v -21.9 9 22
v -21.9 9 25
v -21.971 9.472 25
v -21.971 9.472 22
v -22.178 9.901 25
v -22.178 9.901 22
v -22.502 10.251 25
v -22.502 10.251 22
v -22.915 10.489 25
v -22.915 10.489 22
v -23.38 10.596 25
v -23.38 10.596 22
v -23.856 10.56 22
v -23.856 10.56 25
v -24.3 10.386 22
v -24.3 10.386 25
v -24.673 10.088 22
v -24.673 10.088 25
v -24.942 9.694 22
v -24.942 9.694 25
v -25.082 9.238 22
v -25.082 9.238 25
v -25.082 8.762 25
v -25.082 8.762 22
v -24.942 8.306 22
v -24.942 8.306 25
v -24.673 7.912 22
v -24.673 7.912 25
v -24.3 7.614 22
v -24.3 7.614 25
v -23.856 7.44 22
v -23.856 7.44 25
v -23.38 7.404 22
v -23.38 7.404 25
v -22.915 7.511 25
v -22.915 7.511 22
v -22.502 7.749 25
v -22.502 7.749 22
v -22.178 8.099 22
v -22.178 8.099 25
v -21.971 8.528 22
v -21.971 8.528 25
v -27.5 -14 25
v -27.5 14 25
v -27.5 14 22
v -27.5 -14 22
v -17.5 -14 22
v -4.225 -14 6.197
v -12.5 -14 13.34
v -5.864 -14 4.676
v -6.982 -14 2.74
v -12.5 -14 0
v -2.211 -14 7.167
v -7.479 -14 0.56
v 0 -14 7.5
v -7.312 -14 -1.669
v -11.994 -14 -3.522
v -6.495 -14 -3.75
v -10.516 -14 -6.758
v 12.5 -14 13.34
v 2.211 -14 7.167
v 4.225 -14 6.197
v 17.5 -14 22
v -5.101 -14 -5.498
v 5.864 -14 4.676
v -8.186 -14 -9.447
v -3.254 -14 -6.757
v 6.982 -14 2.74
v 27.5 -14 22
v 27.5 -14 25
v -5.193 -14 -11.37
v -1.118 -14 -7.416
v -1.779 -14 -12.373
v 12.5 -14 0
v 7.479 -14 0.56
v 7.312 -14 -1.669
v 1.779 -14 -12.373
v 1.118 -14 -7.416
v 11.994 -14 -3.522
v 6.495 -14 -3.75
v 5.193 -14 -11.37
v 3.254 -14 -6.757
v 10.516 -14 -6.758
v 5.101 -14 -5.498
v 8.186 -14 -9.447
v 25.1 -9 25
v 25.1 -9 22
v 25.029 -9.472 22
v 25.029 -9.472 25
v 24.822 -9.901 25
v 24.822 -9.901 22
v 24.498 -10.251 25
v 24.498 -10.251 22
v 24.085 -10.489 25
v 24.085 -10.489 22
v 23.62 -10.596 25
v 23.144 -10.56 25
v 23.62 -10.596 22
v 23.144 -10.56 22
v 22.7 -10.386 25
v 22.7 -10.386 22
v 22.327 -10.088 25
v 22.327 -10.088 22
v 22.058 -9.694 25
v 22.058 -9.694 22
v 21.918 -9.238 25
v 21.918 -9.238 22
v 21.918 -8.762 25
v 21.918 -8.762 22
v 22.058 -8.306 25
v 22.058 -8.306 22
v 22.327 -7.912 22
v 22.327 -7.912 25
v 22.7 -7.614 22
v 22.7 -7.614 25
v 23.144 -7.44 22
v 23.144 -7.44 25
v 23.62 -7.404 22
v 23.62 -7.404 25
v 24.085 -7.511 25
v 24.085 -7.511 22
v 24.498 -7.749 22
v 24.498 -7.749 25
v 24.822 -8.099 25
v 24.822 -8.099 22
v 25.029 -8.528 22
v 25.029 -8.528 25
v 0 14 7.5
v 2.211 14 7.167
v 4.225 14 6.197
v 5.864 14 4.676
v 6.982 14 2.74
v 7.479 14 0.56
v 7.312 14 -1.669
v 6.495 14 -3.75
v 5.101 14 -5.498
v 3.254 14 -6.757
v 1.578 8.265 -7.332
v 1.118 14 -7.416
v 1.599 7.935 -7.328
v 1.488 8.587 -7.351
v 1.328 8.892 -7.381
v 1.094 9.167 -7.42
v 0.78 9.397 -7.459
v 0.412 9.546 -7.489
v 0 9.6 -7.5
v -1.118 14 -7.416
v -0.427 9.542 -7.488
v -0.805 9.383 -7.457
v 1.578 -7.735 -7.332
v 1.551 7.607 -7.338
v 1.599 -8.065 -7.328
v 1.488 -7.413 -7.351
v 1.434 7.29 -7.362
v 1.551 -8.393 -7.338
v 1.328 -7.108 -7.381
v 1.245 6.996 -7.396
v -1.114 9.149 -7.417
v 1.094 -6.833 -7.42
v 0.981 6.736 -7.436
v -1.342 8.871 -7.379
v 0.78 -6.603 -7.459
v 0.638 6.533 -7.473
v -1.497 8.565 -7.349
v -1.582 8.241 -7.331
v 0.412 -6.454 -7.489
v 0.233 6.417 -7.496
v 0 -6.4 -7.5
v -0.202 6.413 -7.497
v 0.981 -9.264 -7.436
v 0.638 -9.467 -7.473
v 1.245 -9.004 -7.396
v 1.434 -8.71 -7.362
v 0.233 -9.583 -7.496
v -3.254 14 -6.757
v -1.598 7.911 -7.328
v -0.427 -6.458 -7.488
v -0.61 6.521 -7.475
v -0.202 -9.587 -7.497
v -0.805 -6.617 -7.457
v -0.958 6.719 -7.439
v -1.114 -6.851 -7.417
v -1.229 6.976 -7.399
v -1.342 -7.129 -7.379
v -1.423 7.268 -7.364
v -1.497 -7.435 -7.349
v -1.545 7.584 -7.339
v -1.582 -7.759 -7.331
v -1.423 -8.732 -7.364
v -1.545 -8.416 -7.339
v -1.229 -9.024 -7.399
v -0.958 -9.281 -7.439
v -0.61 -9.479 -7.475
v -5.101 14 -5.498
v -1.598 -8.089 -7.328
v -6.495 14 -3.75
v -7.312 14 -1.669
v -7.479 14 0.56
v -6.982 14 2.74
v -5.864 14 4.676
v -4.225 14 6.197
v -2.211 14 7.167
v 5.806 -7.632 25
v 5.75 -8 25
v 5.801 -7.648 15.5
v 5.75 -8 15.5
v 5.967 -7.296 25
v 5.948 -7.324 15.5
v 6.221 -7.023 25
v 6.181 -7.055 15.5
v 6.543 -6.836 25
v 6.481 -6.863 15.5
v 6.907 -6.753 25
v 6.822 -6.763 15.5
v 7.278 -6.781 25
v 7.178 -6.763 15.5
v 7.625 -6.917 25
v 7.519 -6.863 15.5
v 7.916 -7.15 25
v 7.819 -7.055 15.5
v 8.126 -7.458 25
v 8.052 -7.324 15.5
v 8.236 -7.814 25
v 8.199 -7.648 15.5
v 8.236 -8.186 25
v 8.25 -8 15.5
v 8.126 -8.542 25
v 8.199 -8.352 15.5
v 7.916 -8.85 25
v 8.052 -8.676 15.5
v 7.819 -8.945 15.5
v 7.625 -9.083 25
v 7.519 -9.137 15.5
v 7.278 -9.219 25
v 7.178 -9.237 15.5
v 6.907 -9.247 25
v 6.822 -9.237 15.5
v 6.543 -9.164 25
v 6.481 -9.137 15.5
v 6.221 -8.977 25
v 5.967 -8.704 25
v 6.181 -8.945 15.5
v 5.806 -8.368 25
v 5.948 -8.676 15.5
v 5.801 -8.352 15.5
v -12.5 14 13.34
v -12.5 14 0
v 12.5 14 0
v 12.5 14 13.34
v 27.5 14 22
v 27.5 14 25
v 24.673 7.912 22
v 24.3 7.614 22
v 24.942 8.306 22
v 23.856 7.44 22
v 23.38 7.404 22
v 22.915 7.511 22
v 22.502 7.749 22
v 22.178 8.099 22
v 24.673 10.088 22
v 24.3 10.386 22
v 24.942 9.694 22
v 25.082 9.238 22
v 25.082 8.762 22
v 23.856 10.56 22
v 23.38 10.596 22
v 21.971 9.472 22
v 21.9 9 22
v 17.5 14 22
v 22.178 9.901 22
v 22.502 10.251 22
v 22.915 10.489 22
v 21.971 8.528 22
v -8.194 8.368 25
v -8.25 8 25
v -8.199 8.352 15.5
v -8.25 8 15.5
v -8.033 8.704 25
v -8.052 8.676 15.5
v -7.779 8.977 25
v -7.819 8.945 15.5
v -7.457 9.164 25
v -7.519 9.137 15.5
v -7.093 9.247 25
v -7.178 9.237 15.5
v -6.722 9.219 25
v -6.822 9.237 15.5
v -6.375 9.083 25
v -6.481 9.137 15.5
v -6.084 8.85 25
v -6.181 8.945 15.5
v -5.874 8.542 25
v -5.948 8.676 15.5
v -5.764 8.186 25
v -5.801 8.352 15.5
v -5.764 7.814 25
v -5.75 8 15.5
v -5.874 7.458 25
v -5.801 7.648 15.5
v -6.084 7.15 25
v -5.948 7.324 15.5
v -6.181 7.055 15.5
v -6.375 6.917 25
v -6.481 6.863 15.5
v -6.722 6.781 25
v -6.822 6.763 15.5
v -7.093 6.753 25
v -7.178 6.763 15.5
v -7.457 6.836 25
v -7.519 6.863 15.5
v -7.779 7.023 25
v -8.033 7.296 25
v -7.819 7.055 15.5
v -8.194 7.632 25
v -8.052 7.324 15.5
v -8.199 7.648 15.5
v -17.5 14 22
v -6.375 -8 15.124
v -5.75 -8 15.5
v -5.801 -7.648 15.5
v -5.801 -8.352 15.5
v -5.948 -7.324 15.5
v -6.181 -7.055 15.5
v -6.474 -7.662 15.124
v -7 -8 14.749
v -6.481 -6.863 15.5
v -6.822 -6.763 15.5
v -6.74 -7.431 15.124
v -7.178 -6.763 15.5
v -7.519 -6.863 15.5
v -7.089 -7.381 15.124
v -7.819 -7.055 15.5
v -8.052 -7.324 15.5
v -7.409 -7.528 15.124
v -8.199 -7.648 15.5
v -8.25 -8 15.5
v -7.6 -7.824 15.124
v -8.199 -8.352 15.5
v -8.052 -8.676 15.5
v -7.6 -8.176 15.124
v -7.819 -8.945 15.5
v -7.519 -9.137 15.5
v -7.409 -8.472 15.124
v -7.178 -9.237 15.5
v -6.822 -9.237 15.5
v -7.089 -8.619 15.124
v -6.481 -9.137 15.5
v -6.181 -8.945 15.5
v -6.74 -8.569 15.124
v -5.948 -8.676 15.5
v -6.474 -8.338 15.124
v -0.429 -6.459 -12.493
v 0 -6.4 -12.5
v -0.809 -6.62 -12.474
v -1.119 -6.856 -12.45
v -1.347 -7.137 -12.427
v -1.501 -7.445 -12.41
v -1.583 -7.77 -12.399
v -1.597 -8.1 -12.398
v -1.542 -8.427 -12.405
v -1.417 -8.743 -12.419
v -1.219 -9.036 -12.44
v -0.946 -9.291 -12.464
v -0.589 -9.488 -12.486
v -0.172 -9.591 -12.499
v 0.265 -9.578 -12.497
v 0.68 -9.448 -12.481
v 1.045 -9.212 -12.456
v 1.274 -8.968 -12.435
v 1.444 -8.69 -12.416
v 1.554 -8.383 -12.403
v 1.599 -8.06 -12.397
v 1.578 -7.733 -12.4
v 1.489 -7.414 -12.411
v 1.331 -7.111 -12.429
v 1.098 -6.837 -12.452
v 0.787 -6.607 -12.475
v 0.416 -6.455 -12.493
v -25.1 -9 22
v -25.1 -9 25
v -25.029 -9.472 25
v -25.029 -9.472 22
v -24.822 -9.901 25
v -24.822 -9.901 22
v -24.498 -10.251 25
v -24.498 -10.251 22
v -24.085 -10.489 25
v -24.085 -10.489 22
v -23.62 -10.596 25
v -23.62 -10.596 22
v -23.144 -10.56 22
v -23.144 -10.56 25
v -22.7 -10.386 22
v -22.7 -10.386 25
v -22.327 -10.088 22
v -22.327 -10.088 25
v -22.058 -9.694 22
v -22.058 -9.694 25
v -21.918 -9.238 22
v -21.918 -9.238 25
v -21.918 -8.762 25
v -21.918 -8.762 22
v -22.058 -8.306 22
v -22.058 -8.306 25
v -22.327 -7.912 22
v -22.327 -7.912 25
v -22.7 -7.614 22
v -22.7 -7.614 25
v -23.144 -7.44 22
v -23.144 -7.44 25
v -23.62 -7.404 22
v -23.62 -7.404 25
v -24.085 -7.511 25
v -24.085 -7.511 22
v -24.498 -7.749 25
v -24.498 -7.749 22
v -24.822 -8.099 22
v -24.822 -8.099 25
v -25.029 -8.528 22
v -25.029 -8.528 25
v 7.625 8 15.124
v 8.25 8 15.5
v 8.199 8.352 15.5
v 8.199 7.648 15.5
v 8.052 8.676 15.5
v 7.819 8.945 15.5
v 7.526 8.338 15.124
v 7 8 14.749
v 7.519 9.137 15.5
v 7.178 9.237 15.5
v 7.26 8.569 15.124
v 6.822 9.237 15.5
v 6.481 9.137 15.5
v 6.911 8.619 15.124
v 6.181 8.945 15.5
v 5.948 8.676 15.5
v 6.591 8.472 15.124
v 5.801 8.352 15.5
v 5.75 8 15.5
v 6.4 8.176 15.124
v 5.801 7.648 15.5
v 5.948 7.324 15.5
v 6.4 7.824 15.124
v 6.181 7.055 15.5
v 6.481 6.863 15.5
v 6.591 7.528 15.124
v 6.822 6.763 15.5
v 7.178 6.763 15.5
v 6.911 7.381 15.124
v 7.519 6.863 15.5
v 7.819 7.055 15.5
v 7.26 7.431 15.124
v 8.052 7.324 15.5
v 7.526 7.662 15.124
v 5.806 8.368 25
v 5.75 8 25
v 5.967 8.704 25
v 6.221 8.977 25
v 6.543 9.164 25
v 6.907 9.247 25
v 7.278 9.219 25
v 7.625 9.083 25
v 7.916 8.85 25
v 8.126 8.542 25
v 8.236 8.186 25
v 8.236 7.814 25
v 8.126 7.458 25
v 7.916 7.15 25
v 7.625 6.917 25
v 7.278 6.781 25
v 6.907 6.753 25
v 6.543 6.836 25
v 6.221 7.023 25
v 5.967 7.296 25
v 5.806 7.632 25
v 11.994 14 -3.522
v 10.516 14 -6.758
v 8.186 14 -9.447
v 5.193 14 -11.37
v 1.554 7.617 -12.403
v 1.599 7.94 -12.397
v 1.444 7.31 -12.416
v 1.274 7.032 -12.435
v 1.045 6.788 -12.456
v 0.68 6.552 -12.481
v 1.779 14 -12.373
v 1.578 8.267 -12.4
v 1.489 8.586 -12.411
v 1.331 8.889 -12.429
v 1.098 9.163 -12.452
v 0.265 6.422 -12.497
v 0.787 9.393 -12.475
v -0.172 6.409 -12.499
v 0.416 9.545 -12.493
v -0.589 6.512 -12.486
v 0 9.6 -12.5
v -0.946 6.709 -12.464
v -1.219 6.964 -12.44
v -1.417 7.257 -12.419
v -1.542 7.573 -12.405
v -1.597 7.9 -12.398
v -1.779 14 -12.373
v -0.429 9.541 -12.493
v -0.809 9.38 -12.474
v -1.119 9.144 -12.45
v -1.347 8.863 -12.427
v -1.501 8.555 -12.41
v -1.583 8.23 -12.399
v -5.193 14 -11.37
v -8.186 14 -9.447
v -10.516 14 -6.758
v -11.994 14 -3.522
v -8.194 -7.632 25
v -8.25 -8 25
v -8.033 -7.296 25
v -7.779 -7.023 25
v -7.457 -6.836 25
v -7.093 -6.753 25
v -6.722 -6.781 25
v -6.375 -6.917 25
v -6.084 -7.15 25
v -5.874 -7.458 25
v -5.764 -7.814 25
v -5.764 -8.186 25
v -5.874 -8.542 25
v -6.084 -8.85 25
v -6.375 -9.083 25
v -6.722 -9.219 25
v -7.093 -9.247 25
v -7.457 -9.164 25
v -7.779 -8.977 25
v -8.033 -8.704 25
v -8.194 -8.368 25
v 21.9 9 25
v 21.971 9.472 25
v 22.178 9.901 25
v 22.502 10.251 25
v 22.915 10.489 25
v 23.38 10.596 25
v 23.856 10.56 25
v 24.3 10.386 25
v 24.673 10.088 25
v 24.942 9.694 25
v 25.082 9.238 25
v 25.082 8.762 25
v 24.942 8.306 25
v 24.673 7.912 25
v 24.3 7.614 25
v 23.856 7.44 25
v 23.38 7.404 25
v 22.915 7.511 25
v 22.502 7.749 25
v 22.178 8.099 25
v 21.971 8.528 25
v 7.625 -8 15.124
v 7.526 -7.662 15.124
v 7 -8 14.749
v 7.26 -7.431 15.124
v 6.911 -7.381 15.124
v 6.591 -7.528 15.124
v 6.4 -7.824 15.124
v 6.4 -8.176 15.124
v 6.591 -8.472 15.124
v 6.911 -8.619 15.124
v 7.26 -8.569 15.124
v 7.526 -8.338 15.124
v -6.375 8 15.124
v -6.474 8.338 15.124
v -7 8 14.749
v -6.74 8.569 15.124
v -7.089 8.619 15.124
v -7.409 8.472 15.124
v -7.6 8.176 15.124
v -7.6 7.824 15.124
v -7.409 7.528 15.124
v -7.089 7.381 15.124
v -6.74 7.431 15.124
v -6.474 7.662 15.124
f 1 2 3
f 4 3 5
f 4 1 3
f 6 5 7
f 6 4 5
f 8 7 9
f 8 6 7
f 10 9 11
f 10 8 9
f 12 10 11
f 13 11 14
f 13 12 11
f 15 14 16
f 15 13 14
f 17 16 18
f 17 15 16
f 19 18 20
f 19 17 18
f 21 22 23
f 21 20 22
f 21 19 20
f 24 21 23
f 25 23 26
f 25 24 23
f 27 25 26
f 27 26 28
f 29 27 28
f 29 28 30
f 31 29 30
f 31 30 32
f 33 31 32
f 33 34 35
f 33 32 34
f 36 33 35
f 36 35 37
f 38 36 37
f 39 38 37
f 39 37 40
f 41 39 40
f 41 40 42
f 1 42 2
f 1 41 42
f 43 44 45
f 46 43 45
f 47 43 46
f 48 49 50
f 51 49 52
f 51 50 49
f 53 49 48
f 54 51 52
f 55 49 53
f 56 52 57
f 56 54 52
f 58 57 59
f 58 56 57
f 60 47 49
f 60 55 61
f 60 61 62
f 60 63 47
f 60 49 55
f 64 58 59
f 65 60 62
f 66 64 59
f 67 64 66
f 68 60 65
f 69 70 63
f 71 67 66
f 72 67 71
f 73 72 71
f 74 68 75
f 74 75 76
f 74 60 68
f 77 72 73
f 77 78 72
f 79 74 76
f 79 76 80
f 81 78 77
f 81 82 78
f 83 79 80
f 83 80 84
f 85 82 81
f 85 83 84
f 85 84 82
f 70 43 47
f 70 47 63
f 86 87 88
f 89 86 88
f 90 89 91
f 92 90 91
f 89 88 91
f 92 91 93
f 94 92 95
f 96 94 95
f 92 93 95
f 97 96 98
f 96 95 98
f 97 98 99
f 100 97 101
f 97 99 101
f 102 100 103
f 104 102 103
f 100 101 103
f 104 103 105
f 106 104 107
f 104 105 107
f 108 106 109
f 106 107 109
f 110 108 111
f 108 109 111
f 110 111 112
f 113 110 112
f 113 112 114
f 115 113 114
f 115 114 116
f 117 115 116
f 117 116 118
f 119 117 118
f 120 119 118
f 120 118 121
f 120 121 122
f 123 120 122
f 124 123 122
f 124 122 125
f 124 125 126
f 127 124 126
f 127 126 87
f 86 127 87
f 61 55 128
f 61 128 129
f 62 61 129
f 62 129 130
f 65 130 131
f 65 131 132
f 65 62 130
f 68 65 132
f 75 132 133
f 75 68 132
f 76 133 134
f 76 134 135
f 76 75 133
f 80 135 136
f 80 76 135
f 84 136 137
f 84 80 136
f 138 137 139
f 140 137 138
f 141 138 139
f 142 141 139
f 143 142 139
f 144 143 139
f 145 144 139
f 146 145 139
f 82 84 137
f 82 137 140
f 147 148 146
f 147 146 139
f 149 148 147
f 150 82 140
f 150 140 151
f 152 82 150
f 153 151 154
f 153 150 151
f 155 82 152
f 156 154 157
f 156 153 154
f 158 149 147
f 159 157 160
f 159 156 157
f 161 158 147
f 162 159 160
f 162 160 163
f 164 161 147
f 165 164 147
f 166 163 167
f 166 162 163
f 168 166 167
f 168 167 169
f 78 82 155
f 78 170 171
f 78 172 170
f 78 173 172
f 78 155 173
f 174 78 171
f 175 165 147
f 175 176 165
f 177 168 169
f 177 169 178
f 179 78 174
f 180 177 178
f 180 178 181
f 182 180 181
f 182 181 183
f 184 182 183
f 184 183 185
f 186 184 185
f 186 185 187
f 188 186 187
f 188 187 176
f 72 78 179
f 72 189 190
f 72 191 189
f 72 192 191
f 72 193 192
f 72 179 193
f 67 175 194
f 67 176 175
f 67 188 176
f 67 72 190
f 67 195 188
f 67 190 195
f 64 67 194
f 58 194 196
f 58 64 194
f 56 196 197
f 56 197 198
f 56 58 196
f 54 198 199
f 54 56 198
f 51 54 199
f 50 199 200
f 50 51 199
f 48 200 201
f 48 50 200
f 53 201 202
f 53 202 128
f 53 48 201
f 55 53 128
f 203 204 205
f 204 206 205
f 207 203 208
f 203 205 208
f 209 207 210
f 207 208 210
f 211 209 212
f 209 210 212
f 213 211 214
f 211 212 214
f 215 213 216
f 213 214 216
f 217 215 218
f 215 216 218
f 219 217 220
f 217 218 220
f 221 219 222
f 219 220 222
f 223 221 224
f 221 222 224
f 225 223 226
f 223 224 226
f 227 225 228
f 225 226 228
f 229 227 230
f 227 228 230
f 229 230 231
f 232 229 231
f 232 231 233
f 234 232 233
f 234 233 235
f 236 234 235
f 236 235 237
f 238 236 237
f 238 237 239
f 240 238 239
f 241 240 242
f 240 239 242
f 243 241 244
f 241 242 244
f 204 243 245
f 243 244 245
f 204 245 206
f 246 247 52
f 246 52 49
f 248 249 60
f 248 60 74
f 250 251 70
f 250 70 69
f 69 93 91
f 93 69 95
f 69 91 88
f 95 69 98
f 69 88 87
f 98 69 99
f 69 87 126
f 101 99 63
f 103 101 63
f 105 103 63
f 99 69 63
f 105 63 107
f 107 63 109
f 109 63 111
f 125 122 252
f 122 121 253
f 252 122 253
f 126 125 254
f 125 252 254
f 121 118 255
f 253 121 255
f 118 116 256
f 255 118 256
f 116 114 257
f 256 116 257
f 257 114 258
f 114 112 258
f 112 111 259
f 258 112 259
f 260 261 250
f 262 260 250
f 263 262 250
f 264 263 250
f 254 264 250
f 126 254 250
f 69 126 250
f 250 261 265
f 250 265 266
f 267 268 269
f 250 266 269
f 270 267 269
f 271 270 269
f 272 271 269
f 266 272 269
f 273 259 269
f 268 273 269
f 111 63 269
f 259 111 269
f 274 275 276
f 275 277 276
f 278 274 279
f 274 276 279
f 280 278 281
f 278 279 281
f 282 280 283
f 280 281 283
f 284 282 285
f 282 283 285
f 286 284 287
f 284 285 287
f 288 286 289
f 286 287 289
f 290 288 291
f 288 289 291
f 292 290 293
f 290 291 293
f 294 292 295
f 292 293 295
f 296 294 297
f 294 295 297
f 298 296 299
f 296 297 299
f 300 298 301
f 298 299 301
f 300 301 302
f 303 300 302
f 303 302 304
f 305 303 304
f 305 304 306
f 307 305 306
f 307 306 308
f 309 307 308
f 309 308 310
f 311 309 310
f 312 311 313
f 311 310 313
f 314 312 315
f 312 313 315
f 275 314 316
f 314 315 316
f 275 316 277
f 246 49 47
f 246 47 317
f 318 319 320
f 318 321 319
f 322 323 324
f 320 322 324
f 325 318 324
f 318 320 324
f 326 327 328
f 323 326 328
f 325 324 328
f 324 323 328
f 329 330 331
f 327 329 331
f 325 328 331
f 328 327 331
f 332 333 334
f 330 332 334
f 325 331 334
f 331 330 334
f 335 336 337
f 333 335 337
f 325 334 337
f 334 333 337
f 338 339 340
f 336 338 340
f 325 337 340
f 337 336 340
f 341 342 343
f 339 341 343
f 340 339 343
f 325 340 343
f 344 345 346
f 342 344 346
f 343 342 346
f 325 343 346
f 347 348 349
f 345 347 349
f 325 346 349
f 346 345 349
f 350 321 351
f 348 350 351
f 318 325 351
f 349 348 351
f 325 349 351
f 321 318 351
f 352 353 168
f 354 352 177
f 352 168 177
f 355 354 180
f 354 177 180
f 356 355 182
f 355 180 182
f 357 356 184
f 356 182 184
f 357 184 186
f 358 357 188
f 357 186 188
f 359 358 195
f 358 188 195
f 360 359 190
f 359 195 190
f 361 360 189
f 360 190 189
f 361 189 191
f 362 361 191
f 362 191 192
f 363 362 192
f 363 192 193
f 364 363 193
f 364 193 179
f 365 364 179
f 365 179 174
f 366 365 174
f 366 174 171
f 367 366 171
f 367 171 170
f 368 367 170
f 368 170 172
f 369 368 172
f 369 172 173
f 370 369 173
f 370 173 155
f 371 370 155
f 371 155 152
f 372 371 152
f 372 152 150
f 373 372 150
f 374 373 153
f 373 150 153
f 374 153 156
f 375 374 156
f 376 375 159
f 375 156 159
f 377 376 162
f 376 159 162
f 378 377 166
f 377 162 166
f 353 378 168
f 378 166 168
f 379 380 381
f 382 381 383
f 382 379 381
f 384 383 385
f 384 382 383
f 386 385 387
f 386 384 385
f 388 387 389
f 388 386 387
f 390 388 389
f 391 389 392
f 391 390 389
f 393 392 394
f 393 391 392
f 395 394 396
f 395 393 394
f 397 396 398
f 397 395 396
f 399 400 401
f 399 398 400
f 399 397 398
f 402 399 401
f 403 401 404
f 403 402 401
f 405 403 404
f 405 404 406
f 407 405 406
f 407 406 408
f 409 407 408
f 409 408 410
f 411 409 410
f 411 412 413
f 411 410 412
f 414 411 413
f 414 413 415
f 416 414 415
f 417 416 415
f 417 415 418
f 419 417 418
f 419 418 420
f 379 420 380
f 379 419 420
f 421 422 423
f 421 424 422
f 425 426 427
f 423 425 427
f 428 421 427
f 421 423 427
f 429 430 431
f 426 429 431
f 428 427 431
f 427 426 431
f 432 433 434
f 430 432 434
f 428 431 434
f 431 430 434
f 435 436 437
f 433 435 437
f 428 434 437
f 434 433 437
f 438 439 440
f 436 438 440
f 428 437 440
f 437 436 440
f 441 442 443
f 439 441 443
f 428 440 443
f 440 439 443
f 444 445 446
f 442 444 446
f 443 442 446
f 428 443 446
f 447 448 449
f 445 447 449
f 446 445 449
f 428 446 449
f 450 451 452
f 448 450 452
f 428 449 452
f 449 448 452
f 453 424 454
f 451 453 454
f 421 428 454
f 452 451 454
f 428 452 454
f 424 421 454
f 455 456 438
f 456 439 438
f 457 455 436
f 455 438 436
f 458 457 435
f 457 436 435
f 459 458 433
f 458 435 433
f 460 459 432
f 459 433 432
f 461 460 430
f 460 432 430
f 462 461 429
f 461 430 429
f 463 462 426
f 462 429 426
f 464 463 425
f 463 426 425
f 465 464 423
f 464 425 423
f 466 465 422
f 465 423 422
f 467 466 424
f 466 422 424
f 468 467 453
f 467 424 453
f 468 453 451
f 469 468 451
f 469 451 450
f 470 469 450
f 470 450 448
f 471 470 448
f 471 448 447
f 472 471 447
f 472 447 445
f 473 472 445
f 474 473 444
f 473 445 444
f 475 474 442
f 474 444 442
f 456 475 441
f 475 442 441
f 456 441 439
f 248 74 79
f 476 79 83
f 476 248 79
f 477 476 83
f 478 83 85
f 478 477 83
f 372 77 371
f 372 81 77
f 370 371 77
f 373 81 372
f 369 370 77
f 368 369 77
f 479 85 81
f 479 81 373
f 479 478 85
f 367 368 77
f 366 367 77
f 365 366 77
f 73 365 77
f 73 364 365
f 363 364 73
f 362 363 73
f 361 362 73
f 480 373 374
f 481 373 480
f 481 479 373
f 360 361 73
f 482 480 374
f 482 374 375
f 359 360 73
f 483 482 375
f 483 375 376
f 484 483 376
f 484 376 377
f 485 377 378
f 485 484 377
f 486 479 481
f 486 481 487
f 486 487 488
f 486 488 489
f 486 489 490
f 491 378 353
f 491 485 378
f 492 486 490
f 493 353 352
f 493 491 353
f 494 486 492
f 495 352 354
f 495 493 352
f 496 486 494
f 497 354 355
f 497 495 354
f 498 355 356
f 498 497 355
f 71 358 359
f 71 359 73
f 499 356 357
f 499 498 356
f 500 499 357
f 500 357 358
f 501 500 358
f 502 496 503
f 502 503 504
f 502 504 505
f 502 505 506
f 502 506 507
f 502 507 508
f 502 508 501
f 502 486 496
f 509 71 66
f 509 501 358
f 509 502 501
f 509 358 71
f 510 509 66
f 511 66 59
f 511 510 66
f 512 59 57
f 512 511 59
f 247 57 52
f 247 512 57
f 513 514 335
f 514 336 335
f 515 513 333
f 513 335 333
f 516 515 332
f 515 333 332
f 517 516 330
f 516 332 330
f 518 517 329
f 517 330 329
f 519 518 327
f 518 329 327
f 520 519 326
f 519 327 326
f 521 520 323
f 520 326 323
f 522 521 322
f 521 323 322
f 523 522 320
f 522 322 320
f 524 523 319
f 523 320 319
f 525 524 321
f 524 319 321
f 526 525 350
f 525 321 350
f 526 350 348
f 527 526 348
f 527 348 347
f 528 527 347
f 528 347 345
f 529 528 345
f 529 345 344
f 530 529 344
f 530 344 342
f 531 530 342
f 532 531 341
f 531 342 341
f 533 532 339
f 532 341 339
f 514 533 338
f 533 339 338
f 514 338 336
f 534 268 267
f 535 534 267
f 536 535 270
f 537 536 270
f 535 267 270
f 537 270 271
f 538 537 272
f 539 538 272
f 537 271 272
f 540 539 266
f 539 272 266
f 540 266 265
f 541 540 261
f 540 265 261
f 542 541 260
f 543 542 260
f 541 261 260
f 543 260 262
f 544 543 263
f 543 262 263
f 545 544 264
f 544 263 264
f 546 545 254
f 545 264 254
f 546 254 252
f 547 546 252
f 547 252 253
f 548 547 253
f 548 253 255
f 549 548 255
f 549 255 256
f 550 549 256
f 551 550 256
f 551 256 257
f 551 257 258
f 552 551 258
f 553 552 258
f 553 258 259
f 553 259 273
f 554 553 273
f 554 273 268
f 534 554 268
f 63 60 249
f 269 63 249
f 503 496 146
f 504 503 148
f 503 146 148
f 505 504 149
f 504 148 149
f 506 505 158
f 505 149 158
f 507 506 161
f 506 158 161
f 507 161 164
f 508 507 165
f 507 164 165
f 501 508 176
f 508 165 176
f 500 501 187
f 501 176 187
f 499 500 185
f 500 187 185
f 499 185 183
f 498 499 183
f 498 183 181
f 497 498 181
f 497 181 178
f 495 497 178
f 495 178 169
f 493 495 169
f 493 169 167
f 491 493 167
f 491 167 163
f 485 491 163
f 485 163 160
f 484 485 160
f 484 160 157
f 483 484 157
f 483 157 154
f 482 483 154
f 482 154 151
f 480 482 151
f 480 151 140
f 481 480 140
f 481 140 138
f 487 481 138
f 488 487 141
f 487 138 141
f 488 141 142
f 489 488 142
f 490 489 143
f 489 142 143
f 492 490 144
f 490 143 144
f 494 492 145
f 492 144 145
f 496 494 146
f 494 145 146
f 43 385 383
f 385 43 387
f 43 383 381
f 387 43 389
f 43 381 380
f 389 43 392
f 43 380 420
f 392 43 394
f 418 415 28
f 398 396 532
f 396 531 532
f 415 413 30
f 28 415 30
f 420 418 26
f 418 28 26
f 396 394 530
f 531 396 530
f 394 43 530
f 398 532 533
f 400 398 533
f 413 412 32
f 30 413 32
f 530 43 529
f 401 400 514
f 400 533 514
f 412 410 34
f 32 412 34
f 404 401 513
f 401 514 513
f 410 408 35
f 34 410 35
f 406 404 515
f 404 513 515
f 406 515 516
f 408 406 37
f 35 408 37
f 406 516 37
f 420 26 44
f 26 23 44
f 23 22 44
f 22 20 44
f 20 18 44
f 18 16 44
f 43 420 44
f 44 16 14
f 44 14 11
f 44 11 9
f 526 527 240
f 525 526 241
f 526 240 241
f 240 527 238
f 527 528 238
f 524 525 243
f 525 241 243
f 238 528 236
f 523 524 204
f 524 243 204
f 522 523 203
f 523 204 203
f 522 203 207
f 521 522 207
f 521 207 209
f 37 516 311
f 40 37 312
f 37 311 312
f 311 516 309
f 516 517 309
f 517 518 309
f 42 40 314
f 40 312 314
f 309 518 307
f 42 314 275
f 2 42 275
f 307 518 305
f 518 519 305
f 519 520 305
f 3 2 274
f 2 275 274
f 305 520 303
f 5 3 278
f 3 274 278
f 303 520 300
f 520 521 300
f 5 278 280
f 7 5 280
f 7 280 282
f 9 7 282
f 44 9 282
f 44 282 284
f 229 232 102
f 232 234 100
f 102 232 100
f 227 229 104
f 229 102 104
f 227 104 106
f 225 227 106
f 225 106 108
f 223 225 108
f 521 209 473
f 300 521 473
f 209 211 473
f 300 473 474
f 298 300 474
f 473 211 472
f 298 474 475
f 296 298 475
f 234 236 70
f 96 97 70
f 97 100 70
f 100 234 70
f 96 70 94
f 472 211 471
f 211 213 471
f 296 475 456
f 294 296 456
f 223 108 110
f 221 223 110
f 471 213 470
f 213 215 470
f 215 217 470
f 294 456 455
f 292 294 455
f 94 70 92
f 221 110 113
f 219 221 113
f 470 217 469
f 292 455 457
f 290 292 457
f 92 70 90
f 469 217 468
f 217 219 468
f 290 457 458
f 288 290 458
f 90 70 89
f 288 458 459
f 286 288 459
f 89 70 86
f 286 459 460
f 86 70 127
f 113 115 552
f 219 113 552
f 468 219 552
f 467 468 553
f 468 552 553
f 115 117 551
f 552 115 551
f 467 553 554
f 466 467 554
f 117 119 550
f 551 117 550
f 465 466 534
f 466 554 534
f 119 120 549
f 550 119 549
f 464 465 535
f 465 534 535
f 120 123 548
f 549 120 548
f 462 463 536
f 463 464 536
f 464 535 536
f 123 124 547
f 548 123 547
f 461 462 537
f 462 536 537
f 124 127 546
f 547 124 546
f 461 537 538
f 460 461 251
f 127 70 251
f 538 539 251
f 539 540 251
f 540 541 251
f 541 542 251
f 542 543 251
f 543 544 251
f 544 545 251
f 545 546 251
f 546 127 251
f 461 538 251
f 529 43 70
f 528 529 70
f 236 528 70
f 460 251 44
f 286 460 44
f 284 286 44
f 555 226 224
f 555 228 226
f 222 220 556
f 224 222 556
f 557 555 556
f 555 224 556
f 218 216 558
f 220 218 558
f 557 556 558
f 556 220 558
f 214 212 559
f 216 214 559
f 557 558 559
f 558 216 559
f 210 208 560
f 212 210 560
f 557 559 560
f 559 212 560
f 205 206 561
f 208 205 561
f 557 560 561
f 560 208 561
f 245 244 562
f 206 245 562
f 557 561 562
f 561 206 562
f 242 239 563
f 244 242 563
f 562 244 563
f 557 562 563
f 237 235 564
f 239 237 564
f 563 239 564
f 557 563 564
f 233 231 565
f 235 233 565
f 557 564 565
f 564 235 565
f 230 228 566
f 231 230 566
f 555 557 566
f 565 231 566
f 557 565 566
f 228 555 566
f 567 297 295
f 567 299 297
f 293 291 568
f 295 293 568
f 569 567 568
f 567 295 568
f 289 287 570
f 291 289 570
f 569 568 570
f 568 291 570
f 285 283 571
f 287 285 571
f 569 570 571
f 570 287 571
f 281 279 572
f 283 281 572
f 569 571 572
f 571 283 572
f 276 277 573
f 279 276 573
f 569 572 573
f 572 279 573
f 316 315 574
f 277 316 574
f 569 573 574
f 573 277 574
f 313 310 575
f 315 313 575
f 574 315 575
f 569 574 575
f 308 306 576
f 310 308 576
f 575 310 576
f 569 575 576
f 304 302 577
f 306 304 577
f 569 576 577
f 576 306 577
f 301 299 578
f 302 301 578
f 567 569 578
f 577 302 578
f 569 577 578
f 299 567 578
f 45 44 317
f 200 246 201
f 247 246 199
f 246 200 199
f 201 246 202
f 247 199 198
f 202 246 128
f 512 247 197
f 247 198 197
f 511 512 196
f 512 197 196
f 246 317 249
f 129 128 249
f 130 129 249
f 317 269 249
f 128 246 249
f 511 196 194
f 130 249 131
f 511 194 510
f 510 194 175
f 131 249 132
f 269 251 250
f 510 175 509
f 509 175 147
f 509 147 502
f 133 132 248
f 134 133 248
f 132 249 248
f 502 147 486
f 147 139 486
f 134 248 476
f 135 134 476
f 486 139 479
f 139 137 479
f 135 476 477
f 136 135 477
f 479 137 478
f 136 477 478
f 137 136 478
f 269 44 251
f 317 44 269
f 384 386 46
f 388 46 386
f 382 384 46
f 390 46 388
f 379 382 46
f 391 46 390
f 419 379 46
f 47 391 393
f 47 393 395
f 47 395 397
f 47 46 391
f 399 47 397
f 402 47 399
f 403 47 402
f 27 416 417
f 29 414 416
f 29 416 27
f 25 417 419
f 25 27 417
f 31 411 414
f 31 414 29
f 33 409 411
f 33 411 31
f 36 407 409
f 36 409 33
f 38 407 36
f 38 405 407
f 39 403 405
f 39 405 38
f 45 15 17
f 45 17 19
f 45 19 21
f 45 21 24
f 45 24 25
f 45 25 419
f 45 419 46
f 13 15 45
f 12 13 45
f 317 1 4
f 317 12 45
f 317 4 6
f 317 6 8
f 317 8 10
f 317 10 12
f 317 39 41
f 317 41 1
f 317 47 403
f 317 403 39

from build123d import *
from OCP.BRepFilletAPI import BRepFilletAPI_MakeChamfer

# Parameters (mm, degrees)
SKETCH_1_R             = 7.5
EXTRUDE_1_DEPTH        = 14
SKETCH_7_R             = 1.6
CUT_EXTRUDE_2_DEPTH    = 32.260998065
HOLE_WIZARD_M3_1_D     = 2.5
HOLE_WIZARD_M3_1_DEPTH = 9.5
HOLE_WIZARD_M3_1_TIP   = 0.751075774
SKETCH_9_W             = 3
SKETCH_9_H             = 28
EXTRUDE_2_DEPTH        = 15
SKETCH_10_R            = 1.6
CUT_EXTRUDE_3_DEPTH    = 47.287147349
CHAMFER_1_SIZE         = 5
CHAMFER_1_SIZE2        = 8.660254038


with BuildPart() as part:
    # 草图1 → 凸台-拉伸1 (new, symmetric)
    with BuildSketch(Plane(origin=(0, 0, 0), x_dir=(1, 0, 0), z_dir=(0, 1, 0))):
        with BuildLine():
            Line((-12.5, -25), (12.5, -25))
            Line((12.5, -25), (12.5, 0))
            ThreePointArc((12.5, 0), (0, 12.5), (-12.5, 0))
            Line((-12.5, 0), (-12.5, -25))
        make_face()
        with Locations(Location((0, 0, 0), (0, 0, 270))):
            Circle(SKETCH_1_R, mode=Mode.SUBTRACT)
    extrude(amount=EXTRUDE_1_DEPTH, both=True)

    # 草图7 → 切除-拉伸2 (cut, through all)
    with BuildSketch(Plane.XY):
        with Locations(Location((0, -8, 0), (0, 0, 90))):
            Circle(SKETCH_7_R)
        with Locations(Location((0, 8, 0), (0, 0, 90))):
            Circle(SKETCH_7_R)
    extrude(amount=-CUT_EXTRUDE_2_DEPTH, mode=Mode.SUBTRACT)

    # M3 螺纹孔1
    with Locations(Plane(origin=(-7, -8, 25), x_dir=(1, 0, 0), z_dir=(0, 0, 1))):
        with Locations((0, 0), (14, 0), (14, 16), (0, 16)):
            Hole(HOLE_WIZARD_M3_1_D / 2, depth=HOLE_WIZARD_M3_1_DEPTH)
            with Locations((0, 0, -(HOLE_WIZARD_M3_1_DEPTH + HOLE_WIZARD_M3_1_TIP / 2))):  # 118° drill point
                Cone(0, HOLE_WIZARD_M3_1_D / 2, HOLE_WIZARD_M3_1_TIP, mode=Mode.SUBTRACT)

    # 草图9 → 凸台-拉伸2 (add)
    with BuildSketch(Plane(origin=(12.5, 0, 0), x_dir=(0, 0, -1), z_dir=(1, 0, 0))):
        with Locations((-23.5, 0)):
            Rectangle(SKETCH_9_W, SKETCH_9_H)
    extrude_2 = extrude(amount=EXTRUDE_2_DEPTH)

    # 草图10 → 切除-拉伸3 (cut, through all)
    with BuildSketch(Plane(origin=(0, 0, 22), x_dir=(-1, 0, 0), z_dir=(0, 0, -1))):
        with Locations((-23.5, 9)):
            Circle(SKETCH_10_R)
        with Locations(Location((-23.5, -9, 0), (0, 0, 180))):
            Circle(SKETCH_10_R)
    cut_extrude_3 = extrude(amount=-CUT_EXTRUDE_3_DEPTH, mode=Mode.SUBTRACT)

    # 镜向6: 凸台-拉伸2, 切除-拉伸3 across plane
    add(extrude_2.mirror(Plane(origin=(0, 0, 0), x_dir=(0, 0, 1), z_dir=(1, 0, 0))))
    add(cut_extrude_3.mirror(Plane(origin=(0, 0, 0), x_dir=(0, 0, 1), z_dir=(1, 0, 0))), mode=Mode.SUBTRACT)

    # 倒角1: one chamfer whose edges measure the first distance from different faces: ONE call of the kernel's chamfer builder (chamfer() names one face for all edges)
    chamfer_1_edges_1 = [part.edges().sort_by_distance(p)[0] for p in [
        (12.5, 0, 22),
    ]]
    chamfer_1_side_1 = [part.faces().sort_by_distance(p)[0] for p in [
        (19.860620839, 0, 22),
    ]]
    chamfer_1_edges_2 = [part.edges().sort_by_distance(p)[0] for p in [
        (-12.5, 0, 22),
    ]]
    chamfer_1_side_2 = [part.faces().sort_by_distance(p)[0] for p in [
        (-19.860620839, 0, 22),
    ]]
    chamfer_1 = BRepFilletAPI_MakeChamfer(part.part.solid().wrapped)
    for e in chamfer_1_edges_1:
        chamfer_1.Add(CHAMFER_1_SIZE, CHAMFER_1_SIZE2, e.wrapped, chamfer_1_side_1[0].wrapped)  # the first distance lies on this face
    for e in chamfer_1_edges_2:
        chamfer_1.Add(CHAMFER_1_SIZE, CHAMFER_1_SIZE2, e.wrapped, chamfer_1_side_2[0].wrapped)  # the first distance lies on this face
    add(Compound.cast(chamfer_1.Shape()), mode=Mode.REPLACE)


solid = part.part
